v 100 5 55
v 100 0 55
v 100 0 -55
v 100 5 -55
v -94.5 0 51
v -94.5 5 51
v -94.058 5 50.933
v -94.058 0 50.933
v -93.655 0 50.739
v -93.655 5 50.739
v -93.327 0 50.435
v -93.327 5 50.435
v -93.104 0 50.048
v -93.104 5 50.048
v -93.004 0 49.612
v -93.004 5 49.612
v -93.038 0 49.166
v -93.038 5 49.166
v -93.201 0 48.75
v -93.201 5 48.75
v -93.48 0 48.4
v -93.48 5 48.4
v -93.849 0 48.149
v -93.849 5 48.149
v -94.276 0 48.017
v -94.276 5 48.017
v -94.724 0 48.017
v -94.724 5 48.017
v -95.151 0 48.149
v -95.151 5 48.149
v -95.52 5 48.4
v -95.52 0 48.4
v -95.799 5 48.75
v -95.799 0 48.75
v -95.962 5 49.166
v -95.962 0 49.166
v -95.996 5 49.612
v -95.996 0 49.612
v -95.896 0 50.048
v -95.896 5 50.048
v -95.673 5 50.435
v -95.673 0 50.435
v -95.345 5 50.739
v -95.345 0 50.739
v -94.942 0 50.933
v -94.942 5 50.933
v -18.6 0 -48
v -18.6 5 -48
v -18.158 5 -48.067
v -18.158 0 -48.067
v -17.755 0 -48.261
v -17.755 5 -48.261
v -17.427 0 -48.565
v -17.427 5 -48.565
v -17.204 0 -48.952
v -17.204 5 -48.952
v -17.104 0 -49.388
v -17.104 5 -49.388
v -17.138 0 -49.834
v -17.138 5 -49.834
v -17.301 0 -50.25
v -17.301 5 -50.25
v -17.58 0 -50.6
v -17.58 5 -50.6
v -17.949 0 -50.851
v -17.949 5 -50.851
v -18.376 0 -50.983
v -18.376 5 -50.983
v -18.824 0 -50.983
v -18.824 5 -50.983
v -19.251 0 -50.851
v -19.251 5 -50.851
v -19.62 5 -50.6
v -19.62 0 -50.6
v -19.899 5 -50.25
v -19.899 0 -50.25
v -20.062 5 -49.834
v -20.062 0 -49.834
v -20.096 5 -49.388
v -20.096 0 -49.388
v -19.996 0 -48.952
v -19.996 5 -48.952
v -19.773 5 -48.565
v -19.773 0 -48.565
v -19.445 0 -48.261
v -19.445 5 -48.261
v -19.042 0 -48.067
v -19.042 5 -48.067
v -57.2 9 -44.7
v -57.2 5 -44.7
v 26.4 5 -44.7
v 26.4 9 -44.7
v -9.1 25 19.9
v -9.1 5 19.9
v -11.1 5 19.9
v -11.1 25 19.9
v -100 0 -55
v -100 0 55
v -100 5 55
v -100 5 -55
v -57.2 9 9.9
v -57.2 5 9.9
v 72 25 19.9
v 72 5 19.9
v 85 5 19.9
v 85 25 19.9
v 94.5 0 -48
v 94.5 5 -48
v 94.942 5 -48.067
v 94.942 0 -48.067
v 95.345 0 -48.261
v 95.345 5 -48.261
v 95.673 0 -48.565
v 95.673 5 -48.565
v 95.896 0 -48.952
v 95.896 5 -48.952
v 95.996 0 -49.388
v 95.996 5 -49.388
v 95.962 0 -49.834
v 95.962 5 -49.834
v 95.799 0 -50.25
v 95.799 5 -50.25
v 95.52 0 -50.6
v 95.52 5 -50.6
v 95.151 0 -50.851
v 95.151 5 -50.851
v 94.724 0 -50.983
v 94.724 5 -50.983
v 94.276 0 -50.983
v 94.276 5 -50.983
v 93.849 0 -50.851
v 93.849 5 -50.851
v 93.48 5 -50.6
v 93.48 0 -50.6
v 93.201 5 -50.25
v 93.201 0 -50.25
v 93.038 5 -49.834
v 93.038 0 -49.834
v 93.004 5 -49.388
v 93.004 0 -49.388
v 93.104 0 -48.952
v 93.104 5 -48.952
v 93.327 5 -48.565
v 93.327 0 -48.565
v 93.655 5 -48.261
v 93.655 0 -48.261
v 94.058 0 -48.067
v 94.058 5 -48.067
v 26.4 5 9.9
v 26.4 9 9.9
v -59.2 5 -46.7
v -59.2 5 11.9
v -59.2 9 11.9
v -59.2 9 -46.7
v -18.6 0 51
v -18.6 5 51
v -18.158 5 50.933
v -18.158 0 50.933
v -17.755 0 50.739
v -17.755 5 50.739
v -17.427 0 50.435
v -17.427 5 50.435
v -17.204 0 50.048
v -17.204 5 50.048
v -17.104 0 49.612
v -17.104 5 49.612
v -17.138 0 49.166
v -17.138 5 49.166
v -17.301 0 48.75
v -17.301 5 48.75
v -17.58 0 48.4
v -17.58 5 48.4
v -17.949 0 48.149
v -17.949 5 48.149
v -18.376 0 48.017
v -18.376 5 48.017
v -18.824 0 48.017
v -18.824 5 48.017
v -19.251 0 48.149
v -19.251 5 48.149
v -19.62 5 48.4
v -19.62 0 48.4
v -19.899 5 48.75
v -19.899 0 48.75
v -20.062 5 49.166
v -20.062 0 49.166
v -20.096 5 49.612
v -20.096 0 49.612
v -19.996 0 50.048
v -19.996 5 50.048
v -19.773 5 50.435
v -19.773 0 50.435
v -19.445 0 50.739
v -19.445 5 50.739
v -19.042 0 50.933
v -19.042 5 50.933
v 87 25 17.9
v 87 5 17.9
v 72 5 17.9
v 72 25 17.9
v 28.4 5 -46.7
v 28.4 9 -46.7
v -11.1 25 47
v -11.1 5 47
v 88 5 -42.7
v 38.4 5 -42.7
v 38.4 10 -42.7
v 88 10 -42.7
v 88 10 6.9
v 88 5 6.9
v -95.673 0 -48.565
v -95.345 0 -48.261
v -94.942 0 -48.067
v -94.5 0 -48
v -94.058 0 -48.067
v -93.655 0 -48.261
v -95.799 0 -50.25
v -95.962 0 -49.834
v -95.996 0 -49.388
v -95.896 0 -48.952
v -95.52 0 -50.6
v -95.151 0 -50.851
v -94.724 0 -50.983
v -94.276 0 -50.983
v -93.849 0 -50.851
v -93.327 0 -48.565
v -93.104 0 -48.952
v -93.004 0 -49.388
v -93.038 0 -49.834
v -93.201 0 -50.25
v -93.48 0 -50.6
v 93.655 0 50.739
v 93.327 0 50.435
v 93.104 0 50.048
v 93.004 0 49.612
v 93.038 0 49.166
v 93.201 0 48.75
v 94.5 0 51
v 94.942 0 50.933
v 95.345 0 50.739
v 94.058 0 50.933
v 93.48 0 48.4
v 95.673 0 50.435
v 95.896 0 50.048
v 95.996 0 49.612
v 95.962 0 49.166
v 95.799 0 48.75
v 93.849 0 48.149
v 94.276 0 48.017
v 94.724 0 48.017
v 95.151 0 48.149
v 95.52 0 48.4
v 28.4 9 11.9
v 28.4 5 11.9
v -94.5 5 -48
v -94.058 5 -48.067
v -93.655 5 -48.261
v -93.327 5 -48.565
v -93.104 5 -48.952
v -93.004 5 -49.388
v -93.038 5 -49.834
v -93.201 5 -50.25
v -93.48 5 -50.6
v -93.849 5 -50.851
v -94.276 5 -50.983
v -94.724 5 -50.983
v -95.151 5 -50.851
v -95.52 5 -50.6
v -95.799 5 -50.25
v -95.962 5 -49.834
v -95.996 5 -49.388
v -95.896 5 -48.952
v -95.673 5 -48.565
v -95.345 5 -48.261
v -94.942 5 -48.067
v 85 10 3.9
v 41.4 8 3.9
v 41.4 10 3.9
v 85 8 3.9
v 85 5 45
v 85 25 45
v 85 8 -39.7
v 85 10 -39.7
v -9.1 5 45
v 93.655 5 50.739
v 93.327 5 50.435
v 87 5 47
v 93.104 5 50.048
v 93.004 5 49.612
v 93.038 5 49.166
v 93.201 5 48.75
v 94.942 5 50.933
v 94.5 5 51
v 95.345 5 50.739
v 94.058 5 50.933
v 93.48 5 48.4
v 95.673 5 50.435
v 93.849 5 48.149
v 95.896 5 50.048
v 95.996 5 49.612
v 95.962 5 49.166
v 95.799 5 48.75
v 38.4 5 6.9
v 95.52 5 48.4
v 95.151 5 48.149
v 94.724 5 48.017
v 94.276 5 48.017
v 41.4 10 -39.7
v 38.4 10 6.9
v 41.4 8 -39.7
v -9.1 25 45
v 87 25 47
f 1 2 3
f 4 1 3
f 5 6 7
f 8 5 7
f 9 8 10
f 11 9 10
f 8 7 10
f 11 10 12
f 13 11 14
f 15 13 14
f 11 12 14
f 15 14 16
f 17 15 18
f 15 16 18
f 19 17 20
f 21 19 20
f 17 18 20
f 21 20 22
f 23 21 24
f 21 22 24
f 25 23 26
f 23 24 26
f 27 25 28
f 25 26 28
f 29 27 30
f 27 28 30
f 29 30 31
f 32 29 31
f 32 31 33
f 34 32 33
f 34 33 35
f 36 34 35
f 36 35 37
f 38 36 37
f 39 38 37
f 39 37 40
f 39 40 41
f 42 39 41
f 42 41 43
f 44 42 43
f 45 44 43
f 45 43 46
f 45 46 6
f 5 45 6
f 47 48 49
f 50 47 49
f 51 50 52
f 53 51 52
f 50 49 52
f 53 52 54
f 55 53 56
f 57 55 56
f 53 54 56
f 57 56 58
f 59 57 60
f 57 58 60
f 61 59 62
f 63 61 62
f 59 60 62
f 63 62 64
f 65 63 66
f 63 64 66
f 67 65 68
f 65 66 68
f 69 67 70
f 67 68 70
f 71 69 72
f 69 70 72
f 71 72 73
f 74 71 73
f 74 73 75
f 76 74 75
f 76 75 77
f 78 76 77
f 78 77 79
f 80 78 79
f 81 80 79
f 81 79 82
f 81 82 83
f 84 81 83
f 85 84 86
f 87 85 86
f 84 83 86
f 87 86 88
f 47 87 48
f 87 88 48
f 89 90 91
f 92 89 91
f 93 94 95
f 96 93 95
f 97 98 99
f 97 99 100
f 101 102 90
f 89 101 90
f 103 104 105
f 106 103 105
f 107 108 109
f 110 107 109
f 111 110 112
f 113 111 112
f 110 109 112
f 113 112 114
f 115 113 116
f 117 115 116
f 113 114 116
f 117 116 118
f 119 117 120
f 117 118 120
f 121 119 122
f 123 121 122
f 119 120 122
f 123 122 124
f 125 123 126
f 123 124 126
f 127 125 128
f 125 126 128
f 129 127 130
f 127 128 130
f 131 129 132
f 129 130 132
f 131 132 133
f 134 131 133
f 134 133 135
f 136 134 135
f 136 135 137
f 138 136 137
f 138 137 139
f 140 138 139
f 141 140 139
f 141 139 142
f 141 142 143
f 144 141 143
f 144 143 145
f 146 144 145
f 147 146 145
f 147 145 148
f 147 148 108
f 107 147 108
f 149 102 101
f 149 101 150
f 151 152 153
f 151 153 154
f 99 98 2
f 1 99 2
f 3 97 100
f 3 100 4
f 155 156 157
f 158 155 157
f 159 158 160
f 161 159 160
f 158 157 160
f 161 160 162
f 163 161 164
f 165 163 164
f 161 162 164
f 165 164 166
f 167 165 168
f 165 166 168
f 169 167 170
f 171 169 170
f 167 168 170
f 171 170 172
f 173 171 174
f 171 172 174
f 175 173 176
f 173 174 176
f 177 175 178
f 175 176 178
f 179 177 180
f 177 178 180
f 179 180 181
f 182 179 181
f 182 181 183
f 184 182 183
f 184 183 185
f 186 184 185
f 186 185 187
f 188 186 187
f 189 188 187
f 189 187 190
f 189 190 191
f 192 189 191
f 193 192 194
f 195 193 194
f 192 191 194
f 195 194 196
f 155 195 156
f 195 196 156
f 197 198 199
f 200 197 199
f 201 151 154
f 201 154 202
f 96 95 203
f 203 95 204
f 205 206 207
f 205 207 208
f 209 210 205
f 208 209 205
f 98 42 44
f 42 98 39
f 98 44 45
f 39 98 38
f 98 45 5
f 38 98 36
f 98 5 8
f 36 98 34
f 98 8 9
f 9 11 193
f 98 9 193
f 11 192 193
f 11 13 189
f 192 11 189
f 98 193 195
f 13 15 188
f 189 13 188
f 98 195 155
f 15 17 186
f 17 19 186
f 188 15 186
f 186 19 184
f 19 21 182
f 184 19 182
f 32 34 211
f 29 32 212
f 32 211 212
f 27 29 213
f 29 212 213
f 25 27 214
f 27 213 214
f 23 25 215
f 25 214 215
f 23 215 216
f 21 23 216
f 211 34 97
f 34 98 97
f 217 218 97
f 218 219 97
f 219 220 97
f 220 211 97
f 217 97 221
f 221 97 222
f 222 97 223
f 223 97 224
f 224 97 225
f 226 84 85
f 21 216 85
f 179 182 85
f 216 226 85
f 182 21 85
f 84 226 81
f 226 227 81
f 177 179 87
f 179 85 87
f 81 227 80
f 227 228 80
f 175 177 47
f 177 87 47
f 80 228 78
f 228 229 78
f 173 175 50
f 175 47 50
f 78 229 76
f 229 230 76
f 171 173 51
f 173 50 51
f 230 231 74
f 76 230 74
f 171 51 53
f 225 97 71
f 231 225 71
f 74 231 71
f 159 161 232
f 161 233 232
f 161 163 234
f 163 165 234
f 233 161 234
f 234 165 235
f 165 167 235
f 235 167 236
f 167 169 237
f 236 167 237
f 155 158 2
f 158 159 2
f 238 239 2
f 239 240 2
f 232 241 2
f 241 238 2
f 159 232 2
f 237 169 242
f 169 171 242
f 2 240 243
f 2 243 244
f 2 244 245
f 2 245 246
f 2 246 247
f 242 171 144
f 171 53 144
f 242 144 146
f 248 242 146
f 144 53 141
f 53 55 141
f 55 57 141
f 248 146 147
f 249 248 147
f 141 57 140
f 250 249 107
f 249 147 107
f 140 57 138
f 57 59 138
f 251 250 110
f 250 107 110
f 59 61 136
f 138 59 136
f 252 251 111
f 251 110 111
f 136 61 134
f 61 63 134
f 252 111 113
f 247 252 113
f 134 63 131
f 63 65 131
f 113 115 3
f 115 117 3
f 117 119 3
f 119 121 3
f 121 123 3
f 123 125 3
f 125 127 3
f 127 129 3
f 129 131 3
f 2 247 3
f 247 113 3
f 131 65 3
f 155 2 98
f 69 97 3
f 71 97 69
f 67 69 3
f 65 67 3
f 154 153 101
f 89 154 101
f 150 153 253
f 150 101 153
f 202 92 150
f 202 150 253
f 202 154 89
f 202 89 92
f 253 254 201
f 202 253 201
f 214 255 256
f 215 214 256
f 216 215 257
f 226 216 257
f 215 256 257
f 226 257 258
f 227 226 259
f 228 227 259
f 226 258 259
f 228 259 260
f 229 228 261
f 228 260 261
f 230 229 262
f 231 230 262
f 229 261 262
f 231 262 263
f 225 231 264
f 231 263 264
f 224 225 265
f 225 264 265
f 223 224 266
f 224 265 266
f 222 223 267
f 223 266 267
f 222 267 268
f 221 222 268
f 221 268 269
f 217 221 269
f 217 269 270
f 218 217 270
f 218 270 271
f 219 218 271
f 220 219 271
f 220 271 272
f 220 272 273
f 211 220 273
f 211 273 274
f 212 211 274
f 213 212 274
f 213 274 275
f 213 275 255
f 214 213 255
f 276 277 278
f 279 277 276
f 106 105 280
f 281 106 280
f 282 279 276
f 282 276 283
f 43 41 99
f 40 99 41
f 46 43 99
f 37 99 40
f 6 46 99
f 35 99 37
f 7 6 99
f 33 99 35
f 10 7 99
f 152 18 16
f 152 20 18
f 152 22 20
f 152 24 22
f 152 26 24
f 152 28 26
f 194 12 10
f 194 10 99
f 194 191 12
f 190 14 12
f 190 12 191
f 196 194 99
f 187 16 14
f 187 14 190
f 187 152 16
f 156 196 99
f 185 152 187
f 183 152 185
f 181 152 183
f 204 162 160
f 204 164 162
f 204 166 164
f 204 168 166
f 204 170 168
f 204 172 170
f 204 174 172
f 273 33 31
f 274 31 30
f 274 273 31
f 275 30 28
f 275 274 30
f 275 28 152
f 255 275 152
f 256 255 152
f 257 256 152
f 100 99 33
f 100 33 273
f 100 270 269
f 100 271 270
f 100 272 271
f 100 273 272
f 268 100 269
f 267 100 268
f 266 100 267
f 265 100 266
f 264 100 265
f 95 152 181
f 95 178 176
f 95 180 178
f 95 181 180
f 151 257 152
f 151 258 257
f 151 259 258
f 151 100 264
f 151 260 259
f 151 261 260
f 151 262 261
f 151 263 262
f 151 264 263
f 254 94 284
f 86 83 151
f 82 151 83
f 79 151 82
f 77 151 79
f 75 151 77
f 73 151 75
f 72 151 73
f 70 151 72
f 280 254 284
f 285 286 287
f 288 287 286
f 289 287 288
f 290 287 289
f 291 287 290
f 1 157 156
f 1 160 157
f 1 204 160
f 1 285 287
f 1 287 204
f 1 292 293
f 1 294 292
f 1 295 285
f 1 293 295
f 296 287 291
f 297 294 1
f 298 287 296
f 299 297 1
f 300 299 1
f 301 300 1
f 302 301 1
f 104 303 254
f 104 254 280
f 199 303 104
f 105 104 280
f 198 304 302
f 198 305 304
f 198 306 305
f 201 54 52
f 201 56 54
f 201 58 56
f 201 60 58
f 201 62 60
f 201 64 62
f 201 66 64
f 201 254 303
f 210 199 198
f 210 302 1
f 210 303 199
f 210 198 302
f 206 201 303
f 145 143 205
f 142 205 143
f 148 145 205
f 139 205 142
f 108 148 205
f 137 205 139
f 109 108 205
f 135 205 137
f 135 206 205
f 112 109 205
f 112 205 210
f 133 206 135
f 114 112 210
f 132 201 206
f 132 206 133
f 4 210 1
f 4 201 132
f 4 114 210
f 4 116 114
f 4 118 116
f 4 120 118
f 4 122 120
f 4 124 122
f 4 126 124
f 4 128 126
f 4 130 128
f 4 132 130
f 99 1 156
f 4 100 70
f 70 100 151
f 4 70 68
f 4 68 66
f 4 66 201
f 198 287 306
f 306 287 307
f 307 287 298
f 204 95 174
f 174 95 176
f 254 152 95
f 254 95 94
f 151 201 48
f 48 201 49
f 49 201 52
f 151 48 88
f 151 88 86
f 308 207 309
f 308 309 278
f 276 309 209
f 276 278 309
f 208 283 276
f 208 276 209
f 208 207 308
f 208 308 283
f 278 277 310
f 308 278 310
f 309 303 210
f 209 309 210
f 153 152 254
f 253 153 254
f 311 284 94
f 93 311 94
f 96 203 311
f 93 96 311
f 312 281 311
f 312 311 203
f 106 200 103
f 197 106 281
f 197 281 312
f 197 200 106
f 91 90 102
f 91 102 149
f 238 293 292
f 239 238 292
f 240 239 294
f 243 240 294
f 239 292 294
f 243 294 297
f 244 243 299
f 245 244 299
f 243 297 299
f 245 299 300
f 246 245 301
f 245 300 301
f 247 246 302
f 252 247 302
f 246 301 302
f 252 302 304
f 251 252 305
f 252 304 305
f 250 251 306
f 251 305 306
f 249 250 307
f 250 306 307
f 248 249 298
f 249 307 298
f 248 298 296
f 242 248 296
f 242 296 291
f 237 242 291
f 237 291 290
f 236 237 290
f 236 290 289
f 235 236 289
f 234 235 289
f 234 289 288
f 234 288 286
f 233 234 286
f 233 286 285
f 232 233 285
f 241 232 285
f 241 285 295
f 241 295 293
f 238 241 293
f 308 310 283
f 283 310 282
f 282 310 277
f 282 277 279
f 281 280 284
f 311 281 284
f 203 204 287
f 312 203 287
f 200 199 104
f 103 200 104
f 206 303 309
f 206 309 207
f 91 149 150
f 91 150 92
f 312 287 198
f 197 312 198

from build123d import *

# Parameters (mm, degrees)
SKETCH1_W           = 200
SKETCH1_H           = 110
BOSS_EXTRUDE1_DEPTH = 5
SKETCH4_R           = 1.5
CUT_EXTRUDE1_DEPTH  = 10
BOSS_EXTRUDE2_DEPTH = 20
SKETCH7_W           = 43.6
SKETCH7_H           = 43.6
BOSS_EXTRUDE3_DEPTH = 3
SKETCH7_3_W         = 49.6
SKETCH7_3_H         = 49.6
SKETCH7_3_W_2       = 43.6
SKETCH7_3_H_2       = 43.6
BOSS_EXTRUDE4_DEPTH = 5
SKETCH8_W           = 87.6
SKETCH8_H           = 58.6
SKETCH8_W_2         = 83.6
SKETCH8_H_2         = 54.6
BOSS_EXTRUDE5_DEPTH = 4
SKETCH9_R           = 1.5
CUT_EXTRUDE2_DEPTH  = 5


with BuildPart() as part:
    # Sketch1 → Boss-Extrude1 (new body)
    with BuildSketch(Plane(origin=(0, 0, 0), x_dir=(1, 0, 0), z_dir=(0, 1, 0))):
        Rectangle(SKETCH1_W, SKETCH1_H)
    extrude(amount=BOSS_EXTRUDE1_DEPTH)

    # Sketch4 → Cut-Extrude1 (cut)
    with BuildSketch(Plane(origin=(0, 5, 0), x_dir=(1, 0, 0), z_dir=(0, 1, 0))):
        with Locations((94.5, 49.5)):
            Circle(SKETCH4_R)
        with Locations((-94.5, 49.5)):
            Circle(SKETCH4_R)
        with Locations((-94.5, -49.5)):
            Circle(SKETCH4_R)
        with Locations((94.5, -49.5)):
            Circle(SKETCH4_R)
    extrude(amount=-CUT_EXTRUDE1_DEPTH, mode=Mode.SUBTRACT)

    # Sketch5 → Boss-Extrude2 (add)
    with BuildSketch(Plane(origin=(0, 5, 0), x_dir=(1, 0, 0), z_dir=(0, 1, 0))):
        Polygon((85, -19.9), (85, -45), (-9.1, -45), (-9.1, -19.9), (-11.1, -19.9), (-11.1, -47), (87, -47), (87, -17.9), (72, -17.9), (72, -19.9), align=None)
    extrude(amount=BOSS_EXTRUDE2_DEPTH)

    # Sketch7 → Boss-Extrude3 (add)
    with BuildSketch(Plane(origin=(0, 5, 0), x_dir=(1, 0, 0), z_dir=(0, 1, 0))):
        with Locations((63.2, 17.9)):
            Rectangle(SKETCH7_W, SKETCH7_H)
    extrude(amount=BOSS_EXTRUDE3_DEPTH)

    # Sketch7<3> → Boss-Extrude4 (add)
    with BuildSketch(Plane(origin=(0, 5, 0), x_dir=(1, 0, 0), z_dir=(0, 1, 0))):
        with Locations((63.2, 17.9)):
            Rectangle(SKETCH7_3_W, SKETCH7_3_H)
        with Locations((63.2, 17.9)):
            Rectangle(SKETCH7_3_W_2, SKETCH7_3_H_2, mode=Mode.SUBTRACT)
    extrude(amount=BOSS_EXTRUDE4_DEPTH)

    # Sketch8 → Boss-Extrude5 (add)
    with BuildSketch(Plane(origin=(0, 5, 0), x_dir=(1, 0, 0), z_dir=(0, 1, 0))):
        with Locations((-15.4, 17.4)):
            Rectangle(SKETCH8_W, SKETCH8_H)
        with Locations((-15.4, 17.4)):
            Rectangle(SKETCH8_W_2, SKETCH8_H_2, mode=Mode.SUBTRACT)
    extrude(amount=BOSS_EXTRUDE5_DEPTH)

    # Sketch9 → Cut-Extrude2 (cut)
    with BuildSketch(Plane(origin=(0, 5, 0), x_dir=(1, 0, 0), z_dir=(0, 1, 0))):
        with Locations((-18.6, -49.5)):
            Circle(SKETCH9_R)
        with Locations((-18.6, 49.5)):
            Circle(SKETCH9_R)
    extrude(amount=-CUT_EXTRUDE2_DEPTH, mode=Mode.SUBTRACT)


solid = part.part
